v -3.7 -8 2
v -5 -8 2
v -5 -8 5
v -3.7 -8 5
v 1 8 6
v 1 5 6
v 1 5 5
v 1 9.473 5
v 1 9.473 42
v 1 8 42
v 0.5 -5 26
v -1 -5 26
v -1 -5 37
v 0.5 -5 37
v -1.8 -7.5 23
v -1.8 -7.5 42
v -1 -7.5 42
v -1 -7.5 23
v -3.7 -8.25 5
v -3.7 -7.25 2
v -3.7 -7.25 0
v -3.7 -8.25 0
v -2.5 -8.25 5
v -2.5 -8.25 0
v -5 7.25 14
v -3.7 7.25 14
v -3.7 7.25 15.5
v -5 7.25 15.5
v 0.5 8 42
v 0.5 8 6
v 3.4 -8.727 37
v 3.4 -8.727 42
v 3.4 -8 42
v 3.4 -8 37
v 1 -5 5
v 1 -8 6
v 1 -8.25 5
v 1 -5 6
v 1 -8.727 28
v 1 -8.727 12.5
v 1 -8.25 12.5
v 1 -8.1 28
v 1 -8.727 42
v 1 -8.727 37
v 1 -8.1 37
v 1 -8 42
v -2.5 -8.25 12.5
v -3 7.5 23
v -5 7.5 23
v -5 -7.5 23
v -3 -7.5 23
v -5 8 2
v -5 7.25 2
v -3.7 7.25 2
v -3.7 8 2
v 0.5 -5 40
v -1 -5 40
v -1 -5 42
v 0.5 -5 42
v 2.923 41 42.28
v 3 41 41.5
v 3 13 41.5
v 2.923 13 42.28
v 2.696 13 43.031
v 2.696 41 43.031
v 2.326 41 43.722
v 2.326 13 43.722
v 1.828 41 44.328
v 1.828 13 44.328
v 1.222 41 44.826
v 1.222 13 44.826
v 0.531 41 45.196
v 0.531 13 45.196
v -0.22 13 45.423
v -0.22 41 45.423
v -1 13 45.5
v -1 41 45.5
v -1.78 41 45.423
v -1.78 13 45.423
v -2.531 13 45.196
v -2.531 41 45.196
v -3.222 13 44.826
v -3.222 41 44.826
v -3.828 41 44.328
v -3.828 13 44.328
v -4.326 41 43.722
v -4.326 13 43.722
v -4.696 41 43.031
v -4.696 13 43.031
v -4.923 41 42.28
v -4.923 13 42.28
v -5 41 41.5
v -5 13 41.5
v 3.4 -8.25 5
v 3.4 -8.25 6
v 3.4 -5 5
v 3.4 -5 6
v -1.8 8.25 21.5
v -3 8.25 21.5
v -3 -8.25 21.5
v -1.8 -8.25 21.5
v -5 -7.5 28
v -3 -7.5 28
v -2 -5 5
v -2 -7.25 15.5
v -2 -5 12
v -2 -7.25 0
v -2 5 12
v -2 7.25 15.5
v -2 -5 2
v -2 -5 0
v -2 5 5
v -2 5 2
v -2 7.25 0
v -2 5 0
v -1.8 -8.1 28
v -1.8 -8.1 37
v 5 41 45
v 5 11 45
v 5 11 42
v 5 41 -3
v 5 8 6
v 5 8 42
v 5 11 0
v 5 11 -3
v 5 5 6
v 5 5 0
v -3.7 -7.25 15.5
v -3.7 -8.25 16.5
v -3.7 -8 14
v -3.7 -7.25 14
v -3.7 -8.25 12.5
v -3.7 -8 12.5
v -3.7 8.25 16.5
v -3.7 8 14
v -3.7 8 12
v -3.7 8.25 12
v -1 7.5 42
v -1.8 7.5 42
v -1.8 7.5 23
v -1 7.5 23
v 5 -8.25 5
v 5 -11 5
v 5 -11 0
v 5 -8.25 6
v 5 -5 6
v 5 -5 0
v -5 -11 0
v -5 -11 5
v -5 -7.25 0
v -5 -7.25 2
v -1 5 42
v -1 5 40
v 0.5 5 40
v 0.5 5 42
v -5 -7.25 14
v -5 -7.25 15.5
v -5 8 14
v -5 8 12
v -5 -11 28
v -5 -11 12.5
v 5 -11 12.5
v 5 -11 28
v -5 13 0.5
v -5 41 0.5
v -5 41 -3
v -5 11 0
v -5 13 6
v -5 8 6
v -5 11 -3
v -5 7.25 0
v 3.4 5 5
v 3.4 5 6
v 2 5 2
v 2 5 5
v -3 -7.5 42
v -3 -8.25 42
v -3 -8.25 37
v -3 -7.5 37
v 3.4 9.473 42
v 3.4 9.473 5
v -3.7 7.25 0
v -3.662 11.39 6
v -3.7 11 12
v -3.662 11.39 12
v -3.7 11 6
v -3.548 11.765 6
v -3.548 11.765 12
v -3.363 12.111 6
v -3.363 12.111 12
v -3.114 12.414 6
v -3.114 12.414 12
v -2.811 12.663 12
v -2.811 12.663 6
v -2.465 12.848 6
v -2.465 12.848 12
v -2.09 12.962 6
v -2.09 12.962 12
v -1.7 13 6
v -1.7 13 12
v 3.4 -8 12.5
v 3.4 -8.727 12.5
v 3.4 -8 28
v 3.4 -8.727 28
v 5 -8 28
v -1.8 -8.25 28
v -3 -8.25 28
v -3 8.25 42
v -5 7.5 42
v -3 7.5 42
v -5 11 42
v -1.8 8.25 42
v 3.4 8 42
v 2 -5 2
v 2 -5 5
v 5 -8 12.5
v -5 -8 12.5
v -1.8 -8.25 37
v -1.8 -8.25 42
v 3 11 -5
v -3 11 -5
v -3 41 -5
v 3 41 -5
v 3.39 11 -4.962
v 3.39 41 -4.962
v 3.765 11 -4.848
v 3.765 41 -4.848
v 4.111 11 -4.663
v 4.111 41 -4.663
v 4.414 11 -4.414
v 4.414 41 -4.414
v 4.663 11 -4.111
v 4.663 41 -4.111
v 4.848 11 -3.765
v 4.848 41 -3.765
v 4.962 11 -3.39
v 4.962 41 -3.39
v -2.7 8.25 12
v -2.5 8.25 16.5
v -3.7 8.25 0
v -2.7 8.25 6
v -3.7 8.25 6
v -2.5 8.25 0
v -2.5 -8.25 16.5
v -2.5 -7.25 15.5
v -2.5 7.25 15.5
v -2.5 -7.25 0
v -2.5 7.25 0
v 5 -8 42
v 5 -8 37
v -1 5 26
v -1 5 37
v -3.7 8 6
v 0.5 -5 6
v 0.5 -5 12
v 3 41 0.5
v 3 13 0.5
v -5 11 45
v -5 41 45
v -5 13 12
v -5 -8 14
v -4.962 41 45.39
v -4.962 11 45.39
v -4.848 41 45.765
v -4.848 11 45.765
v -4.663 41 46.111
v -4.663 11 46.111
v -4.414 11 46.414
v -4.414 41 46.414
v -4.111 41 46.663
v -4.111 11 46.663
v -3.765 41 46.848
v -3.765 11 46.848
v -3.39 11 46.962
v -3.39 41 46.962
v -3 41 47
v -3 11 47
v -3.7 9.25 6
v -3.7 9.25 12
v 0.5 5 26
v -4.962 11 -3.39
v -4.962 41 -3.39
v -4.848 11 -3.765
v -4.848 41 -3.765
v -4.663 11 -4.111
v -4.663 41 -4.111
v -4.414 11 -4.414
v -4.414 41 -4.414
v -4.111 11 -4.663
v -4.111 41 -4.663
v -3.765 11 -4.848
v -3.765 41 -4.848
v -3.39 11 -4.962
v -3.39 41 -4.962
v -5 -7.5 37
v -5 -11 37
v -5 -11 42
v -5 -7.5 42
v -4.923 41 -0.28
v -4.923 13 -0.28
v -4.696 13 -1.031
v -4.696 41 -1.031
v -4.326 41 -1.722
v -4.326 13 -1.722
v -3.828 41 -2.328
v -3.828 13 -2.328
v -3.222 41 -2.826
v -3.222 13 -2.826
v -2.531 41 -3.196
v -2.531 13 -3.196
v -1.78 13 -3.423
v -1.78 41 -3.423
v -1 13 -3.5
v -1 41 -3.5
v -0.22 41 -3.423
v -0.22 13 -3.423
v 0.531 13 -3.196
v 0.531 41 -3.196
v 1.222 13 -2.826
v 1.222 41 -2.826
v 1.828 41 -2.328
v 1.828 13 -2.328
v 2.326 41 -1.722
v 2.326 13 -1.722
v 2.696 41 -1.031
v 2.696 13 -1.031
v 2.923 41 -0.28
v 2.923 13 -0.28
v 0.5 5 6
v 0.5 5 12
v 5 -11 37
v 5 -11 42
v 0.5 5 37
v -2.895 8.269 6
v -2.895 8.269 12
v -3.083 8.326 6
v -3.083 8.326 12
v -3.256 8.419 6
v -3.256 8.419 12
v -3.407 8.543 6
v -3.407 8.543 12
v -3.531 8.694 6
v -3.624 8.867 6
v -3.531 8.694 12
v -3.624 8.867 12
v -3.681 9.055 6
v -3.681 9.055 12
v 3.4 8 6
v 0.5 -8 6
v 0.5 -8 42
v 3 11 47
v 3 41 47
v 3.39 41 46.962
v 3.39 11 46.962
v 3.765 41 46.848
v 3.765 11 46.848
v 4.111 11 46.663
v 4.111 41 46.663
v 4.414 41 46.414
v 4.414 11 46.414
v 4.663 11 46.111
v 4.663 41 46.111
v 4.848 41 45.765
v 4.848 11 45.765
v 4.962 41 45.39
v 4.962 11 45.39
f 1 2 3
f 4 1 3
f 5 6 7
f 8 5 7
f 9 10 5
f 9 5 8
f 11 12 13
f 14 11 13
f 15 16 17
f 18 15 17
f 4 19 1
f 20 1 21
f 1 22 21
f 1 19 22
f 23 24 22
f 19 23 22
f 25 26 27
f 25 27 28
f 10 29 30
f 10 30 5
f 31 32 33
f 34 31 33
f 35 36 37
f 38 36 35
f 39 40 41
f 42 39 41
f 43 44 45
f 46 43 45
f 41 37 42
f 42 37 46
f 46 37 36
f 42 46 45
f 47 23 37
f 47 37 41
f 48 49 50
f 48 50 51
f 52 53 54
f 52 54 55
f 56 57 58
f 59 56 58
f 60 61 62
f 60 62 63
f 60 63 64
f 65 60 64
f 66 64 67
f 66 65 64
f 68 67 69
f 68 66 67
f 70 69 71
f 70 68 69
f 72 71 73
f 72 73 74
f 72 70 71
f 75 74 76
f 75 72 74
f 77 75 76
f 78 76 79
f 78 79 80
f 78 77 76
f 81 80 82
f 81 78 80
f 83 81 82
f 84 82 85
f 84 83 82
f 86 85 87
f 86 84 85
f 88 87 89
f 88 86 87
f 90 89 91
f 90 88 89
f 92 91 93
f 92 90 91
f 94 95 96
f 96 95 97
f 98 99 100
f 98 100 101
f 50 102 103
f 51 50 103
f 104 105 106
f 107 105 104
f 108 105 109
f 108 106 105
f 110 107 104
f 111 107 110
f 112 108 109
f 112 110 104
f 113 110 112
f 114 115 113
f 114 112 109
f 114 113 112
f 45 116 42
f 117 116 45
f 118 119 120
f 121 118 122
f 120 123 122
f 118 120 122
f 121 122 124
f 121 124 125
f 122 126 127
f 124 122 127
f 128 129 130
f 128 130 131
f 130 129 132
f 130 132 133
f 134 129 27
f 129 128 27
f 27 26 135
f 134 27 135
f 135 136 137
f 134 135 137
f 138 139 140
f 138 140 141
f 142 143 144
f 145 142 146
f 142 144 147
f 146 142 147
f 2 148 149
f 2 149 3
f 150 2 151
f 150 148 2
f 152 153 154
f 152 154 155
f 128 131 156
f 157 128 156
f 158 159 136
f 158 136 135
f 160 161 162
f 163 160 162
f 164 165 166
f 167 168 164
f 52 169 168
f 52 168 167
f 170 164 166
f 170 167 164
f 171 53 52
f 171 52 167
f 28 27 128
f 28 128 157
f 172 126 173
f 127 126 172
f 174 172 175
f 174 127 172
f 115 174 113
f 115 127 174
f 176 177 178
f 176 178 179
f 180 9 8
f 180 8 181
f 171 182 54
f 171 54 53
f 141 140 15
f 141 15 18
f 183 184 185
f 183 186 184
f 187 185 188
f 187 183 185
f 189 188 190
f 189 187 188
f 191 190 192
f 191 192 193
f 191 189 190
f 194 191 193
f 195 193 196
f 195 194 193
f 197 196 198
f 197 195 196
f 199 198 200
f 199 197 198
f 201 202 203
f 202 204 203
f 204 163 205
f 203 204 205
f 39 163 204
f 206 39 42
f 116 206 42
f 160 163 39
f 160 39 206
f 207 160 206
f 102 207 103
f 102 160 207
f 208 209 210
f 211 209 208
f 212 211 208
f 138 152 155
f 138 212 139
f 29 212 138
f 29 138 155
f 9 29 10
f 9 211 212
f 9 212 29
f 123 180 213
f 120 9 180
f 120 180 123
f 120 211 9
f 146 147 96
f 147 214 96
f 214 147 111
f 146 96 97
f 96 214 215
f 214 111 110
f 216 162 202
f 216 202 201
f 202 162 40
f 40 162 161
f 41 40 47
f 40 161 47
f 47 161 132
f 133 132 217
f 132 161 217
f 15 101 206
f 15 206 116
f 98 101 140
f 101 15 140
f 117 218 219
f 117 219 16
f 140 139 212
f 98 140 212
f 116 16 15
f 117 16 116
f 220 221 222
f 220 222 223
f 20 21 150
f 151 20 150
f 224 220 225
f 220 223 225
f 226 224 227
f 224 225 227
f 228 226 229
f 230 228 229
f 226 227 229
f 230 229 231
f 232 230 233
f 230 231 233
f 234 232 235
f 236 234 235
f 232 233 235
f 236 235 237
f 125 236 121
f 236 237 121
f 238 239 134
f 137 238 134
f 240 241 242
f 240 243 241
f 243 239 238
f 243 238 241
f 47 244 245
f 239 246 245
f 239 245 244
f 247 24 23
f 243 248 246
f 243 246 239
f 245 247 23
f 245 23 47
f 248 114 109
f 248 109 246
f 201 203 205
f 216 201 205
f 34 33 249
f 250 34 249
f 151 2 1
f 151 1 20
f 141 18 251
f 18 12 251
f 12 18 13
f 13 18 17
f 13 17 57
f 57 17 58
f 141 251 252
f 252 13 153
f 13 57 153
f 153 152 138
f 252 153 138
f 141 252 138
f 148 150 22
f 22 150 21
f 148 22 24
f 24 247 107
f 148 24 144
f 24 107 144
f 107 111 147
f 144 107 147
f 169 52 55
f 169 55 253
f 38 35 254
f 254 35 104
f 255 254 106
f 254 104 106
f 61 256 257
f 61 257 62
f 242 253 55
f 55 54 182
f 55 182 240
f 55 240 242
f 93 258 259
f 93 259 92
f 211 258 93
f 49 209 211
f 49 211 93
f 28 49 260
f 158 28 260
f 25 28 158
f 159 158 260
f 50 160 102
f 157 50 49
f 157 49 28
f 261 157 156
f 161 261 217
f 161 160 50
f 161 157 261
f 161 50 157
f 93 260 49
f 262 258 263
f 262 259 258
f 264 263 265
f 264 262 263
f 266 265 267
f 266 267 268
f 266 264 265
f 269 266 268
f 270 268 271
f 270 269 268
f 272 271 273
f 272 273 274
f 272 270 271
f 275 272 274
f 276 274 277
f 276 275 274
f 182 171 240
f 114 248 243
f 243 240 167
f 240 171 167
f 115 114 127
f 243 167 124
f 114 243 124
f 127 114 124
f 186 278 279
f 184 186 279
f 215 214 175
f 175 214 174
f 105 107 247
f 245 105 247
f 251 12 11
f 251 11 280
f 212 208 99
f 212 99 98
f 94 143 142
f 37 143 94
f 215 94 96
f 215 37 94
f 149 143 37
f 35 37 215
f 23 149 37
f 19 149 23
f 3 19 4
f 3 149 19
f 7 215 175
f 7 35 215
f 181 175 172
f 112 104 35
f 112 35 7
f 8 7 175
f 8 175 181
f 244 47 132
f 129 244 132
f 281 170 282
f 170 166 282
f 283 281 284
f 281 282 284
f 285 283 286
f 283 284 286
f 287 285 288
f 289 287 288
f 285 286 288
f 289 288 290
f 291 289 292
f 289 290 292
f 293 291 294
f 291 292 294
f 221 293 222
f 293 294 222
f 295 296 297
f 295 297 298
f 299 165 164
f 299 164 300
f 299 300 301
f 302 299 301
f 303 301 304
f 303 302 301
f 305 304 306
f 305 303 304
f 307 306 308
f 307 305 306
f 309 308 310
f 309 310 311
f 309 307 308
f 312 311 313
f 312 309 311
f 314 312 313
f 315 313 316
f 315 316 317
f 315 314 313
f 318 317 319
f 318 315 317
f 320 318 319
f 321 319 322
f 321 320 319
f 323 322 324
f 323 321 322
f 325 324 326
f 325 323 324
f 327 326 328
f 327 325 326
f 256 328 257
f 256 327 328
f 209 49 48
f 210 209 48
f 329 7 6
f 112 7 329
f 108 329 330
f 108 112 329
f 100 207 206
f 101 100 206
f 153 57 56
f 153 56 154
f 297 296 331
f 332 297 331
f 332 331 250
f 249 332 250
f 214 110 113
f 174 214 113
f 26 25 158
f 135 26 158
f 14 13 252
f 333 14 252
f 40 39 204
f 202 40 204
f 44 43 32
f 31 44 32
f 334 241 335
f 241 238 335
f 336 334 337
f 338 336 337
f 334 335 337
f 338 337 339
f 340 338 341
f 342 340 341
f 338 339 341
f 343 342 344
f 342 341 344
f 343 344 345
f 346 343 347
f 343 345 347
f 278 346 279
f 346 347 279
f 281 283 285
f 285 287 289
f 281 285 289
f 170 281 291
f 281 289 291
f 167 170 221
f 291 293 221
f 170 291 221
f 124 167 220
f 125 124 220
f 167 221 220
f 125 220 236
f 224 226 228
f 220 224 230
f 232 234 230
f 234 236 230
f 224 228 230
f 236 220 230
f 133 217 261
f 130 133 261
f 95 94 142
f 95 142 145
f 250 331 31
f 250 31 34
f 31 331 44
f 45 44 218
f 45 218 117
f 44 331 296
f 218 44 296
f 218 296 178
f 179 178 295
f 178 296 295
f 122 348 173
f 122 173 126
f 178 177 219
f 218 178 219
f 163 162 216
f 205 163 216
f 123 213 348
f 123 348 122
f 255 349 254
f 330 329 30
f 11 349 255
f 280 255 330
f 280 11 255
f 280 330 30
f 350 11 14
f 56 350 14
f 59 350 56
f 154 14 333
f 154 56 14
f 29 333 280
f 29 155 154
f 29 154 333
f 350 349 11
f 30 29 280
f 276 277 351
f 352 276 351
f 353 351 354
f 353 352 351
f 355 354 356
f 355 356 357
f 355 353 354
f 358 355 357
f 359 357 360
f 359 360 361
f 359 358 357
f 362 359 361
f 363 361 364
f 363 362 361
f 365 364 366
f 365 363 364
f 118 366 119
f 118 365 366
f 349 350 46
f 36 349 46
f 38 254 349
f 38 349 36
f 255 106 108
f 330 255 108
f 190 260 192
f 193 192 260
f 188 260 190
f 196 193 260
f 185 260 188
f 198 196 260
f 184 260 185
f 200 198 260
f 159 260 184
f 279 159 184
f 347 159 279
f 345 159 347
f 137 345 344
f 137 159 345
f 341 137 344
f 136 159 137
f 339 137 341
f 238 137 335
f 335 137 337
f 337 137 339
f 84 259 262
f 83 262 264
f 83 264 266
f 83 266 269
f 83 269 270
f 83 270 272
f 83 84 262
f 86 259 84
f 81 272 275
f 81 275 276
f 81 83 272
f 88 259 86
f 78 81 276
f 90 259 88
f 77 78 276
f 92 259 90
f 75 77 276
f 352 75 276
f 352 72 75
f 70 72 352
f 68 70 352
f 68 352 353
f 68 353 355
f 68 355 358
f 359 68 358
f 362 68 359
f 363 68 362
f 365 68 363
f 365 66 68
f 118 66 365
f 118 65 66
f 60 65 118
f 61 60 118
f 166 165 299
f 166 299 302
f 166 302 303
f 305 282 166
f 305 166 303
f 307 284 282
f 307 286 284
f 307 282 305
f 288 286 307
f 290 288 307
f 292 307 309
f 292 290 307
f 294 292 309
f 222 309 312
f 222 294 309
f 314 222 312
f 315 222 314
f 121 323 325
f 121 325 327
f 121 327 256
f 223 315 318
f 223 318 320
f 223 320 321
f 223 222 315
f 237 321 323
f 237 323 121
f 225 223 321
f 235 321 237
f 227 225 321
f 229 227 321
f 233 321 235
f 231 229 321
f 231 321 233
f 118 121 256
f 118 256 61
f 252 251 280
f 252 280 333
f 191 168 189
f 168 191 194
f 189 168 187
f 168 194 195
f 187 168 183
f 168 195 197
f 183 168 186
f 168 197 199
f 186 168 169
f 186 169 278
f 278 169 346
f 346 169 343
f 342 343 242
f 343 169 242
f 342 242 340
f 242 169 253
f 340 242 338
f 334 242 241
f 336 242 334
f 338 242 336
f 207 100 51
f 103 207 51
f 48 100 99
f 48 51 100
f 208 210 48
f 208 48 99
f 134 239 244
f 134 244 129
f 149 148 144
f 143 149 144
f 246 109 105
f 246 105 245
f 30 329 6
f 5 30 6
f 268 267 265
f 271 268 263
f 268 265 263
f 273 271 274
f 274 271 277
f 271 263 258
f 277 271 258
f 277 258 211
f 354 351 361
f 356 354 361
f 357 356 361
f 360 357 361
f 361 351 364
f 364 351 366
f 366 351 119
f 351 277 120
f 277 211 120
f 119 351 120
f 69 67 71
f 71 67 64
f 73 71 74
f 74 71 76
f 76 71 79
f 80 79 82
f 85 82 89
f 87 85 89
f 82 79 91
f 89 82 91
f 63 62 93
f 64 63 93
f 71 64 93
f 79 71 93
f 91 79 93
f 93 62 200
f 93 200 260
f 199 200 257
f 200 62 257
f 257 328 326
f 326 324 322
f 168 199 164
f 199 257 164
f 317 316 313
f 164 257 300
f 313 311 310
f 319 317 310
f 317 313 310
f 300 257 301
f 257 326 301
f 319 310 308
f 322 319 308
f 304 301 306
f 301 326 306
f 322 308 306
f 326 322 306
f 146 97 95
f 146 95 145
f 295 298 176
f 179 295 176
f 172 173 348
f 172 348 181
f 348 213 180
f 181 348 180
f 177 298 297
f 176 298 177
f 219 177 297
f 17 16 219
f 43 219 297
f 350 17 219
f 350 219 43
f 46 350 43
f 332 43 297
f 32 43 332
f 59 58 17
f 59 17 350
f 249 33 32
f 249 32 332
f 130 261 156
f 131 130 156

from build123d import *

# Parameters (mm, degrees)
SKETCH1_W           = 10
SKETCH1_H           = 22
BOSS_EXTRUDE1_DEPTH = 42
SKETCH2_W           = 4.5
SKETCH2_H           = 16
CUT_EXTRUDE1_DEPTH  = 36
SKETCH4_W           = 2.4
SKETCH4_H           = 18.2
CUT_EXTRUDE3_DEPTH  = 37
SKETCH5_W           = 4
SKETCH5_H           = 15
CUT_EXTRUDE4_DEPTH  = 19
SKETCH6_W           = 1.2
SKETCH6_H           = 16.5
CUT_EXTRUDE5_DEPTH  = 20.5
SKETCH8_W           = 3
SKETCH8_H           = 14.5
CUT_EXTRUDE6_DEPTH  = 15.5
SKETCH9_W           = 1.2
SKETCH9_H           = 16.5
CUT_EXTRUDE7_DEPTH  = 16.5
SKETCH10_W          = 12
SKETCH10_H          = 16
CUT_EXTRUDE8_DEPTH  = 2.5
SKETCH12_W          = 9
SKETCH12_H          = 2.9
SKETCH12_W_2        = 7.5
SKETCH12_H_2        = 2.75
CUT_EXTRUDE11_DEPTH = 10
CUT_EXTRUDE12_REACH = 12
SKETCH13_W          = 9
SKETCH13_H          = 0.6
SKETCH13_W_2        = 7.5
SKETCH13_H_2        = 0.25
CUT_EXTRUDE13_REACH = 12
SKETCH14_W          = 9
SKETCH14_H          = 0.1
SKETCH14_W_2        = 6.5
SKETCH14_H_2        = 0.25
SKETCH15_W          = 2
SKETCH15_H          = 10
SKETCH15_W_2        = 11
CUT_EXTRUDE14_DEPTH = 7
SKETCH16_W          = 2
SKETCH16_H          = 10
SKETCH16_W_2        = 7
CUT_EXTRUDE15_DEPTH = 10
SKETCH17_W          = 3
SKETCH17_H          = 10
CUT_EXTRUDE16_DEPTH = 10
SKETCH18_W          = 10
SKETCH18_H          = 52
BOSS_EXTRUDE3_DEPTH = 30
SKETCH21_W          = 1.3
SKETCH21_H          = 6
CUT_EXTRUDE18_DEPTH = 28
FILLET1_R           = 2
FILLET3_R           = 1
CUT_EXTRUDE19_DEPTH = 28
FILLET4_R           = 2


with BuildPart() as part:
    # Sketch1 → Boss-Extrude1 (new body)
    with BuildSketch(Plane.XY):
        Rectangle(SKETCH1_W, SKETCH1_H)
    extrude(amount=BOSS_EXTRUDE1_DEPTH)

    # Sketch2 → Cut-Extrude1 (cut)
    with BuildSketch(Plane.XY.offset(42)):
        with Locations((2.75, 0)):
            Rectangle(SKETCH2_W, SKETCH2_H)
    extrude(amount=-CUT_EXTRUDE1_DEPTH, mode=Mode.SUBTRACT)

    # Sketch4 → Cut-Extrude3 (cut)
    with BuildSketch(Plane.XY.offset(42)):
        with Locations((2.2, 0.373327294)):
            Rectangle(SKETCH4_W, SKETCH4_H)
    extrude(amount=-CUT_EXTRUDE3_DEPTH, mode=Mode.SUBTRACT)

    # Sketch5 → Cut-Extrude4 (cut)
    with BuildSketch(Plane.XY.offset(42)):
        with Locations((-3, 0)):
            Rectangle(SKETCH5_W, SKETCH5_H)
    extrude(amount=-CUT_EXTRUDE4_DEPTH, mode=Mode.SUBTRACT)

    # Sketch6 → Cut-Extrude5 (cut)
    with BuildSketch(Plane.XY.offset(42)):
        with Locations((-2.4, 0)):
            Rectangle(SKETCH6_W, SKETCH6_H)
    extrude(amount=-CUT_EXTRUDE5_DEPTH, mode=Mode.SUBTRACT)

    # Sketch8 → Cut-Extrude6 (cut)
    with BuildSketch(Plane(origin=(0, 0, 0), x_dir=(-1, 0, 0), z_dir=(0, 0, -1))):
        with Locations((3.5, 0)):
            Rectangle(SKETCH8_W, SKETCH8_H)
    extrude(amount=-CUT_EXTRUDE6_DEPTH, mode=Mode.SUBTRACT)

    # Sketch9 → Cut-Extrude7 (cut)
    with BuildSketch(Plane(origin=(0, 0, 0), x_dir=(-1, 0, 0), z_dir=(0, 0, -1))):
        with Locations((3.1, 0)):
            Rectangle(SKETCH9_W, SKETCH9_H)
    extrude(amount=-CUT_EXTRUDE7_DEPTH, mode=Mode.SUBTRACT)

    # Sketch10 → Cut-Extrude8 (cut)
    with BuildSketch(Plane.ZY.offset(5)):
        with Locations((8, 0)):
            Rectangle(SKETCH10_W, SKETCH10_H)
    extrude(amount=-CUT_EXTRUDE8_DEPTH, mode=Mode.SUBTRACT)

    # Sketch12 → Cut-Extrude11 (cut)
    with BuildSketch(Plane.ZY.offset(5)):
        with Locations((32.5, -9.55)):
            Rectangle(SKETCH12_W, SKETCH12_H)
        with Locations((8.75, -9.625)):
            Rectangle(SKETCH12_W_2, SKETCH12_H_2)
    extrude(amount=-CUT_EXTRUDE11_DEPTH, mode=Mode.SUBTRACT)

    # Sketch13 → Cut-Extrude12 (cut, up to next)
    with BuildSketch(Plane.ZY.offset(5), mode=Mode.PRIVATE) as cut_extrude12_sk1:
        with Locations((32.5, -7.8)):
            Rectangle(SKETCH13_W, SKETCH13_H)
    cut_extrude12_tool1 = extrude(cut_extrude12_sk1.sketch, amount=-CUT_EXTRUDE12_REACH, mode=Mode.PRIVATE) & part.part
    add(cut_extrude12_tool1.solids().sort_by_distance((-5, -7.8, 32.5))[0], mode=Mode.SUBTRACT)
    # Sketch13 → Cut-Extrude12 (cut, up to next)
    with BuildSketch(Plane.ZY.offset(5), mode=Mode.PRIVATE) as cut_extrude12_sk2:
        with Locations((8.75, -8.125)):
            Rectangle(SKETCH13_W_2, SKETCH13_H_2)
    cut_extrude12_tool2 = extrude(cut_extrude12_sk2.sketch, amount=-CUT_EXTRUDE12_REACH, mode=Mode.PRIVATE) & part.part
    add(cut_extrude12_tool2.solids().sort_by_distance((-5, -8.125, 8.75))[0], mode=Mode.SUBTRACT)

    # Sketch14 → Cut-Extrude13 (cut, up to next)
    with BuildSketch(Plane(origin=(5, 0, 0), x_dir=(0, 0, -1), z_dir=(1, 0, 0)), mode=Mode.PRIVATE) as cut_extrude13_sk1:
        with Locations((-32.5, -8.05)):
            Rectangle(SKETCH14_W, SKETCH14_H)
    cut_extrude13_tool1 = extrude(cut_extrude13_sk1.sketch, amount=-CUT_EXTRUDE13_REACH, mode=Mode.PRIVATE) & part.part
    add(cut_extrude13_tool1.solids().sort_by_distance((5, -8.05, 32.5))[0], mode=Mode.SUBTRACT)
    # Sketch14 → Cut-Extrude13 (cut, up to next)
    with BuildSketch(Plane(origin=(5, 0, 0), x_dir=(0, 0, -1), z_dir=(1, 0, 0)), mode=Mode.PRIVATE) as cut_extrude13_sk2:
        with Locations((-9.25, -8.125)):
            Rectangle(SKETCH14_W_2, SKETCH14_H_2)
    cut_extrude13_tool2 = extrude(cut_extrude13_sk2.sketch, amount=-CUT_EXTRUDE13_REACH, mode=Mode.PRIVATE) & part.part
    add(cut_extrude13_tool2.solids().sort_by_distance((5, -8.125, 9.25))[0], mode=Mode.SUBTRACT)

    # Sketch15 → Cut-Extrude14 (cut, through all)
    with BuildSketch(Plane.ZY.offset(1)):
        with Locations((41, 0)):
            Rectangle(SKETCH15_W, SKETCH15_H)
        with Locations((31.5, 0)):
            Rectangle(SKETCH15_W_2, SKETCH15_H)
    extrude(amount=-CUT_EXTRUDE14_DEPTH, mode=Mode.SUBTRACT)

    # Sketch16 → Cut-Extrude15 (cut)
    with BuildSketch(Plane.ZY.offset(2)):
        with Locations((1, 0)):
            Rectangle(SKETCH16_W, SKETCH16_H)
        with Locations((8.5, 0)):
            Rectangle(SKETCH16_W_2, SKETCH16_H)
    extrude(amount=-CUT_EXTRUDE15_DEPTH, mode=Mode.SUBTRACT)

    # Sketch17 → Cut-Extrude16 (cut)
    with BuildSketch(Plane(origin=(0, 0, 2), x_dir=(-1, 0, 0), z_dir=(0, 0, -1))):
        with Locations((-3.5, 0)):
            Rectangle(SKETCH17_W, SKETCH17_H)
    extrude(amount=-CUT_EXTRUDE16_DEPTH, mode=Mode.SUBTRACT)

    # Sketch18 → Boss-Extrude3 (add)
    with BuildSketch(Plane(origin=(0, 11, 0), x_dir=(1, 0, 0), z_dir=(0, 1, 0))):
        with Locations((0, -21)):
            Rectangle(SKETCH18_W, SKETCH18_H)
    extrude(amount=BOSS_EXTRUDE3_DEPTH)

    # Sketch21 → Cut-Extrude18 (cut)
    with BuildSketch(Plane.XZ.offset(-8)):
        with Locations((-4.35, 9)):
            Rectangle(SKETCH21_W, SKETCH21_H)
    extrude(amount=-CUT_EXTRUDE18_DEPTH, mode=Mode.SUBTRACT)

    # Fillet1
    fillet1_edges = [part.edges().sort_by_distance(p)[0] for p in [
        (5, 26, -5),
        (-5, 26, -5),
        (5, 26, 47),
        (-5, 26, 47),
    ]]
    fillet(fillet1_edges, radius=FILLET1_R)

    # Fillet3
    fillet3_edges = [part.edges().sort_by_distance(p)[0] for p in [
        (-3.7, 8.25, 9),
    ]]
    fillet(fillet3_edges, radius=FILLET3_R)

    # Sketch22 → Cut-Extrude19 (cut)
    with BuildSketch(Plane(origin=(0, 41, 0), x_dir=(1, 0, 0), z_dir=(0, 1, 0))):
        with BuildLine():
            Line((-5, -41.5), (-5, -0.5))
            ThreePointArc((-5, -0.5), (-1, 3.5), (3, -0.5))
            Line((3, -0.5), (3, -41.5))
            ThreePointArc((3, -41.5), (-1, -45.5), (-5, -41.5))
        make_face()
    extrude(amount=-CUT_EXTRUDE19_DEPTH, mode=Mode.SUBTRACT)

    # Fillet4
    fillet4_edges = [part.edges().sort_by_distance(p)[0] for p in [
        (-3.7, 13, 9),
    ]]
    fillet(fillet4_edges, radius=FILLET4_R)


solid = part.part
